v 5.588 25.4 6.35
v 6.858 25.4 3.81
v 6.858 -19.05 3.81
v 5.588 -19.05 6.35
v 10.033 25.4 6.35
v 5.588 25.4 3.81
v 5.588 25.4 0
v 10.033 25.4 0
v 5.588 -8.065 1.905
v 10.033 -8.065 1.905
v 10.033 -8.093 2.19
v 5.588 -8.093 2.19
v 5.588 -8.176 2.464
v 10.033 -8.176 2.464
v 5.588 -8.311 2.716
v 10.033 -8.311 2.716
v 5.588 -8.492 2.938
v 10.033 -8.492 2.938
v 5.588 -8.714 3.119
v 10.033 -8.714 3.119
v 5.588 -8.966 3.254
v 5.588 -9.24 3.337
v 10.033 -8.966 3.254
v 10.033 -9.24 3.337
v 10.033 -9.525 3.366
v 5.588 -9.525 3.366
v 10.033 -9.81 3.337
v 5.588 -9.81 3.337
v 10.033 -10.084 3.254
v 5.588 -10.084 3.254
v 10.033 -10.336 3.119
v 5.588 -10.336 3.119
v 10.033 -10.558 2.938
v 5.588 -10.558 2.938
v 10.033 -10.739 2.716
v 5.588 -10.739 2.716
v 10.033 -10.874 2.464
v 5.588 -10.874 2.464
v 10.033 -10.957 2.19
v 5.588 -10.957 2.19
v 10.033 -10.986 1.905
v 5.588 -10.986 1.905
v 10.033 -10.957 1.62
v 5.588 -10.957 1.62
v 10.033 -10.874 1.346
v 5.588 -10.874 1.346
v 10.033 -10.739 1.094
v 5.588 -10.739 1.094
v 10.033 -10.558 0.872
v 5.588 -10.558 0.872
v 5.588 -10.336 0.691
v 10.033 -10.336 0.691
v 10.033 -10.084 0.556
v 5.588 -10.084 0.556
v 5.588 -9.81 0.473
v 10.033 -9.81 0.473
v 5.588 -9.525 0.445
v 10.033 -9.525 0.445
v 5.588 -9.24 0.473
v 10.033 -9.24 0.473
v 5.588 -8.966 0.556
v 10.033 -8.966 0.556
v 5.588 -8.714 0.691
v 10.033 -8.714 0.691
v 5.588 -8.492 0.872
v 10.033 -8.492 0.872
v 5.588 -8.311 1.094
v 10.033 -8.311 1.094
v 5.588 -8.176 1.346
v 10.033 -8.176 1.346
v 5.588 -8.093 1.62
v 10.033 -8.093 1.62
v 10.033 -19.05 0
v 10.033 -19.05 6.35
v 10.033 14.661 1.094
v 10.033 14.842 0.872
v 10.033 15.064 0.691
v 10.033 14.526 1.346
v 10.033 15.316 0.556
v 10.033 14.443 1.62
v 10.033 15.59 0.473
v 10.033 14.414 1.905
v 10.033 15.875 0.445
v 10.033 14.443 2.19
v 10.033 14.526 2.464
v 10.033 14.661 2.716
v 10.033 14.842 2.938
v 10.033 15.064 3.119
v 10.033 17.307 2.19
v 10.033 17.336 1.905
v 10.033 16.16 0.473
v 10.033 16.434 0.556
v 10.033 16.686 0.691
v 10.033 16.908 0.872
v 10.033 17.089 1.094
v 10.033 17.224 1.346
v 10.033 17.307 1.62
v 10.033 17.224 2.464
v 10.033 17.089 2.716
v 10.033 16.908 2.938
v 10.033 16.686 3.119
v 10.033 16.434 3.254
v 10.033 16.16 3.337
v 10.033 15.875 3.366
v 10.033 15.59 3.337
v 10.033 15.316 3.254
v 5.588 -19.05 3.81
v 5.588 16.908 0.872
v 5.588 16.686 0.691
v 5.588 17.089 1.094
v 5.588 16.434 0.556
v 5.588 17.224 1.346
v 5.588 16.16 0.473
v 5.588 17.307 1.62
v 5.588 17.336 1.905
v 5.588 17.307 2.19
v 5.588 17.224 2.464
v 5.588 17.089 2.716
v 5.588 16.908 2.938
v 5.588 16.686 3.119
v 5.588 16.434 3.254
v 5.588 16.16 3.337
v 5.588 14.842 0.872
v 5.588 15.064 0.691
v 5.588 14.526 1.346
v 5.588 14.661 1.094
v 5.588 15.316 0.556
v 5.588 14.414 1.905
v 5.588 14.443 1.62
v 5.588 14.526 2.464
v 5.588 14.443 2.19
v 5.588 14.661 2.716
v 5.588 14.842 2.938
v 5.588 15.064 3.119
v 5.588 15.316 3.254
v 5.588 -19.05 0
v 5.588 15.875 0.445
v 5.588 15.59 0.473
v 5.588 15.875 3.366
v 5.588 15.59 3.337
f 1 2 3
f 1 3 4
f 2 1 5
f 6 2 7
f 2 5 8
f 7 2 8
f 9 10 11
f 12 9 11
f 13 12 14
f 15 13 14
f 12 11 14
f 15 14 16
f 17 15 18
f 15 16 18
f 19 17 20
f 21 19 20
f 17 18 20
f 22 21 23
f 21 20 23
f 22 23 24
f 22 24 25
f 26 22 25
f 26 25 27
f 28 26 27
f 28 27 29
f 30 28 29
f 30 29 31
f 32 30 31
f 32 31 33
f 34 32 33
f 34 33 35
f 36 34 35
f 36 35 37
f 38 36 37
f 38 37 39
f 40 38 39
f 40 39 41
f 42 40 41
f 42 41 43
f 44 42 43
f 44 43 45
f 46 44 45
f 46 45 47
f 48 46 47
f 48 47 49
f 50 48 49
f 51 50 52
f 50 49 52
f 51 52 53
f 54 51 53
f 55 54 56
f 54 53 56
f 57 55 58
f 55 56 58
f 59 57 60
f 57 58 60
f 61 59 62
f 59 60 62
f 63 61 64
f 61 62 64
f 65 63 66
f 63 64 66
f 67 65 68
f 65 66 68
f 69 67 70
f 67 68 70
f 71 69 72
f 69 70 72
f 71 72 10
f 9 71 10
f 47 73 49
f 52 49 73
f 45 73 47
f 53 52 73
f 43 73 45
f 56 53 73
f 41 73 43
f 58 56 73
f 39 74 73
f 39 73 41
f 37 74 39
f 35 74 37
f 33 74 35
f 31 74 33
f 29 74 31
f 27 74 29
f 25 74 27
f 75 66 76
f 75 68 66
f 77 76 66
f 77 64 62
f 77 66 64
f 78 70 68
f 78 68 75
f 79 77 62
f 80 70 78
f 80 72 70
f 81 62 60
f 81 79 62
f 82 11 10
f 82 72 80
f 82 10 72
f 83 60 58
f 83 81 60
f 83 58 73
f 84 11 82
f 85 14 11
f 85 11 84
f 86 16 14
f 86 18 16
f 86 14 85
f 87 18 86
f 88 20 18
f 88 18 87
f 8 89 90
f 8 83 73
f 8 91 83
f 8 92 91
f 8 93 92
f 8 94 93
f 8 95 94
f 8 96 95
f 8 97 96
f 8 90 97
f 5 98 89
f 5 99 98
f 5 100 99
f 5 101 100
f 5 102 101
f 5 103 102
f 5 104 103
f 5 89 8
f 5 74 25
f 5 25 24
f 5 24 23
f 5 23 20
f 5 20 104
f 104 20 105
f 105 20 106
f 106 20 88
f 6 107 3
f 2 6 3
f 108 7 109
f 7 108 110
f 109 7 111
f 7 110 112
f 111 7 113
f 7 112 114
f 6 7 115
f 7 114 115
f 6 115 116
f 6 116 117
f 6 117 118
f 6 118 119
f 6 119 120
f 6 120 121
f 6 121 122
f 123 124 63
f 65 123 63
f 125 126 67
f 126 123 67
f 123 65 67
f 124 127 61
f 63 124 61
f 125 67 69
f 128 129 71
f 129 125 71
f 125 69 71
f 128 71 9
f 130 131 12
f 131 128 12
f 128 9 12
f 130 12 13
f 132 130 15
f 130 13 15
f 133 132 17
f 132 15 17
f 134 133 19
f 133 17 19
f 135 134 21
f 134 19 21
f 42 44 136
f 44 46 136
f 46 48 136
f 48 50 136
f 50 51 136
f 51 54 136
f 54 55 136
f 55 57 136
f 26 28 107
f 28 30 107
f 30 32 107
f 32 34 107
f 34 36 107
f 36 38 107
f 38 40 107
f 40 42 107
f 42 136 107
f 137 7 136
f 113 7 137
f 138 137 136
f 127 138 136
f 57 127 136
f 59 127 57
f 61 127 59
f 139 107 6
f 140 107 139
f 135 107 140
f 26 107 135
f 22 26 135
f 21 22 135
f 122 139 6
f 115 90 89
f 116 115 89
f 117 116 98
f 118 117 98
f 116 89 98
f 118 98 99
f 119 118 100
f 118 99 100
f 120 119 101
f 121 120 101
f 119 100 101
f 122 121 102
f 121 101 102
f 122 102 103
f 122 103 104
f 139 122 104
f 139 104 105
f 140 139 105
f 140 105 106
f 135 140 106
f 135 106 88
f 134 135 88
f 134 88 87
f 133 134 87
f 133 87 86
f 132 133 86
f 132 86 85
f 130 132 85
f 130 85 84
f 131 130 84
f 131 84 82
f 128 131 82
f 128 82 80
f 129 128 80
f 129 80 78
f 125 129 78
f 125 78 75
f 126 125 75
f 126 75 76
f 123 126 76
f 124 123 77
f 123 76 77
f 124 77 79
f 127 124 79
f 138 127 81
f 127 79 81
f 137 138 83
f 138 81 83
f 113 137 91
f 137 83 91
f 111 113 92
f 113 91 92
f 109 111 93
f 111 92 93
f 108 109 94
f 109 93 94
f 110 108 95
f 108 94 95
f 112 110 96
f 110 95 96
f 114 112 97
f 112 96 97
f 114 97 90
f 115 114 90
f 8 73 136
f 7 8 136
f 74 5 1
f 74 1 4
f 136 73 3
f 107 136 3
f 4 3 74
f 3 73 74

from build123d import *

# Parameters (mm, degrees)
F1_DEPTH = 10.033
F3_DEPTH = 76.2
F5_DEPTH = 76.2
F7_D     = 2.921
F7_DEPTH = 8.255
F9_DEPTH = 4.446


with BuildPart() as f1:
    # F0 (on Right) → F1 (new body, symmetric)
    with BuildSketch(Plane.YZ):
        Polygon((19.05, -6.35), (31.75, 6.35), (-19.05, 6.35), (-31.75, -6.35), align=None)
    extrude(amount=F1_DEPTH, both=True)

    # F2 (on Front) → F3 (cut, symmetric)
    with BuildSketch(Plane.XZ):
        Polygon((-6.858, -3.81), (-5.588, -6.35), (5.588, -6.35), (6.858, -3.81), align=None)
        Polygon((5.588, 6.35), (-5.588, 6.35), (-6.858, 3.81), (6.858, 3.81), align=None)
    extrude(amount=F3_DEPTH, both=True, mode=Mode.SUBTRACT)

    # F4 (on Front) → F5 (cut, symmetric)
    with BuildSketch(Plane.XZ):
        Polygon((16.257983, -9.573173), (10.033, 0), (5.588, 0), (5.588, 6.35), (-11.387688, 6.35), (-11.387688, -9.573173), align=None)
    extrude(amount=F5_DEPTH, both=True, mode=Mode.SUBTRACT)

    # F7
    with Locations(Plane(origin=(5.588, 0, 0), x_dir=(0, -1, 0), z_dir=(-1, 0, 0))):
        with Locations((-15.875, 1.905), (9.525, 1.905)):
            Hole(F7_D / 2, depth=F7_DEPTH)

    # F8 (on face) → F9 (cut, through all)
    with BuildSketch(Plane.YZ.offset(10.033)):
        Polygon((-19.05, 6.35), (-25.4, 0), (-19.05, 0), align=None)
        Polygon((25.4, 6.35), (25.4, 0), (31.75, 6.35), align=None)
    extrude(amount=-F9_DEPTH, mode=Mode.SUBTRACT)


solid = f1.part
